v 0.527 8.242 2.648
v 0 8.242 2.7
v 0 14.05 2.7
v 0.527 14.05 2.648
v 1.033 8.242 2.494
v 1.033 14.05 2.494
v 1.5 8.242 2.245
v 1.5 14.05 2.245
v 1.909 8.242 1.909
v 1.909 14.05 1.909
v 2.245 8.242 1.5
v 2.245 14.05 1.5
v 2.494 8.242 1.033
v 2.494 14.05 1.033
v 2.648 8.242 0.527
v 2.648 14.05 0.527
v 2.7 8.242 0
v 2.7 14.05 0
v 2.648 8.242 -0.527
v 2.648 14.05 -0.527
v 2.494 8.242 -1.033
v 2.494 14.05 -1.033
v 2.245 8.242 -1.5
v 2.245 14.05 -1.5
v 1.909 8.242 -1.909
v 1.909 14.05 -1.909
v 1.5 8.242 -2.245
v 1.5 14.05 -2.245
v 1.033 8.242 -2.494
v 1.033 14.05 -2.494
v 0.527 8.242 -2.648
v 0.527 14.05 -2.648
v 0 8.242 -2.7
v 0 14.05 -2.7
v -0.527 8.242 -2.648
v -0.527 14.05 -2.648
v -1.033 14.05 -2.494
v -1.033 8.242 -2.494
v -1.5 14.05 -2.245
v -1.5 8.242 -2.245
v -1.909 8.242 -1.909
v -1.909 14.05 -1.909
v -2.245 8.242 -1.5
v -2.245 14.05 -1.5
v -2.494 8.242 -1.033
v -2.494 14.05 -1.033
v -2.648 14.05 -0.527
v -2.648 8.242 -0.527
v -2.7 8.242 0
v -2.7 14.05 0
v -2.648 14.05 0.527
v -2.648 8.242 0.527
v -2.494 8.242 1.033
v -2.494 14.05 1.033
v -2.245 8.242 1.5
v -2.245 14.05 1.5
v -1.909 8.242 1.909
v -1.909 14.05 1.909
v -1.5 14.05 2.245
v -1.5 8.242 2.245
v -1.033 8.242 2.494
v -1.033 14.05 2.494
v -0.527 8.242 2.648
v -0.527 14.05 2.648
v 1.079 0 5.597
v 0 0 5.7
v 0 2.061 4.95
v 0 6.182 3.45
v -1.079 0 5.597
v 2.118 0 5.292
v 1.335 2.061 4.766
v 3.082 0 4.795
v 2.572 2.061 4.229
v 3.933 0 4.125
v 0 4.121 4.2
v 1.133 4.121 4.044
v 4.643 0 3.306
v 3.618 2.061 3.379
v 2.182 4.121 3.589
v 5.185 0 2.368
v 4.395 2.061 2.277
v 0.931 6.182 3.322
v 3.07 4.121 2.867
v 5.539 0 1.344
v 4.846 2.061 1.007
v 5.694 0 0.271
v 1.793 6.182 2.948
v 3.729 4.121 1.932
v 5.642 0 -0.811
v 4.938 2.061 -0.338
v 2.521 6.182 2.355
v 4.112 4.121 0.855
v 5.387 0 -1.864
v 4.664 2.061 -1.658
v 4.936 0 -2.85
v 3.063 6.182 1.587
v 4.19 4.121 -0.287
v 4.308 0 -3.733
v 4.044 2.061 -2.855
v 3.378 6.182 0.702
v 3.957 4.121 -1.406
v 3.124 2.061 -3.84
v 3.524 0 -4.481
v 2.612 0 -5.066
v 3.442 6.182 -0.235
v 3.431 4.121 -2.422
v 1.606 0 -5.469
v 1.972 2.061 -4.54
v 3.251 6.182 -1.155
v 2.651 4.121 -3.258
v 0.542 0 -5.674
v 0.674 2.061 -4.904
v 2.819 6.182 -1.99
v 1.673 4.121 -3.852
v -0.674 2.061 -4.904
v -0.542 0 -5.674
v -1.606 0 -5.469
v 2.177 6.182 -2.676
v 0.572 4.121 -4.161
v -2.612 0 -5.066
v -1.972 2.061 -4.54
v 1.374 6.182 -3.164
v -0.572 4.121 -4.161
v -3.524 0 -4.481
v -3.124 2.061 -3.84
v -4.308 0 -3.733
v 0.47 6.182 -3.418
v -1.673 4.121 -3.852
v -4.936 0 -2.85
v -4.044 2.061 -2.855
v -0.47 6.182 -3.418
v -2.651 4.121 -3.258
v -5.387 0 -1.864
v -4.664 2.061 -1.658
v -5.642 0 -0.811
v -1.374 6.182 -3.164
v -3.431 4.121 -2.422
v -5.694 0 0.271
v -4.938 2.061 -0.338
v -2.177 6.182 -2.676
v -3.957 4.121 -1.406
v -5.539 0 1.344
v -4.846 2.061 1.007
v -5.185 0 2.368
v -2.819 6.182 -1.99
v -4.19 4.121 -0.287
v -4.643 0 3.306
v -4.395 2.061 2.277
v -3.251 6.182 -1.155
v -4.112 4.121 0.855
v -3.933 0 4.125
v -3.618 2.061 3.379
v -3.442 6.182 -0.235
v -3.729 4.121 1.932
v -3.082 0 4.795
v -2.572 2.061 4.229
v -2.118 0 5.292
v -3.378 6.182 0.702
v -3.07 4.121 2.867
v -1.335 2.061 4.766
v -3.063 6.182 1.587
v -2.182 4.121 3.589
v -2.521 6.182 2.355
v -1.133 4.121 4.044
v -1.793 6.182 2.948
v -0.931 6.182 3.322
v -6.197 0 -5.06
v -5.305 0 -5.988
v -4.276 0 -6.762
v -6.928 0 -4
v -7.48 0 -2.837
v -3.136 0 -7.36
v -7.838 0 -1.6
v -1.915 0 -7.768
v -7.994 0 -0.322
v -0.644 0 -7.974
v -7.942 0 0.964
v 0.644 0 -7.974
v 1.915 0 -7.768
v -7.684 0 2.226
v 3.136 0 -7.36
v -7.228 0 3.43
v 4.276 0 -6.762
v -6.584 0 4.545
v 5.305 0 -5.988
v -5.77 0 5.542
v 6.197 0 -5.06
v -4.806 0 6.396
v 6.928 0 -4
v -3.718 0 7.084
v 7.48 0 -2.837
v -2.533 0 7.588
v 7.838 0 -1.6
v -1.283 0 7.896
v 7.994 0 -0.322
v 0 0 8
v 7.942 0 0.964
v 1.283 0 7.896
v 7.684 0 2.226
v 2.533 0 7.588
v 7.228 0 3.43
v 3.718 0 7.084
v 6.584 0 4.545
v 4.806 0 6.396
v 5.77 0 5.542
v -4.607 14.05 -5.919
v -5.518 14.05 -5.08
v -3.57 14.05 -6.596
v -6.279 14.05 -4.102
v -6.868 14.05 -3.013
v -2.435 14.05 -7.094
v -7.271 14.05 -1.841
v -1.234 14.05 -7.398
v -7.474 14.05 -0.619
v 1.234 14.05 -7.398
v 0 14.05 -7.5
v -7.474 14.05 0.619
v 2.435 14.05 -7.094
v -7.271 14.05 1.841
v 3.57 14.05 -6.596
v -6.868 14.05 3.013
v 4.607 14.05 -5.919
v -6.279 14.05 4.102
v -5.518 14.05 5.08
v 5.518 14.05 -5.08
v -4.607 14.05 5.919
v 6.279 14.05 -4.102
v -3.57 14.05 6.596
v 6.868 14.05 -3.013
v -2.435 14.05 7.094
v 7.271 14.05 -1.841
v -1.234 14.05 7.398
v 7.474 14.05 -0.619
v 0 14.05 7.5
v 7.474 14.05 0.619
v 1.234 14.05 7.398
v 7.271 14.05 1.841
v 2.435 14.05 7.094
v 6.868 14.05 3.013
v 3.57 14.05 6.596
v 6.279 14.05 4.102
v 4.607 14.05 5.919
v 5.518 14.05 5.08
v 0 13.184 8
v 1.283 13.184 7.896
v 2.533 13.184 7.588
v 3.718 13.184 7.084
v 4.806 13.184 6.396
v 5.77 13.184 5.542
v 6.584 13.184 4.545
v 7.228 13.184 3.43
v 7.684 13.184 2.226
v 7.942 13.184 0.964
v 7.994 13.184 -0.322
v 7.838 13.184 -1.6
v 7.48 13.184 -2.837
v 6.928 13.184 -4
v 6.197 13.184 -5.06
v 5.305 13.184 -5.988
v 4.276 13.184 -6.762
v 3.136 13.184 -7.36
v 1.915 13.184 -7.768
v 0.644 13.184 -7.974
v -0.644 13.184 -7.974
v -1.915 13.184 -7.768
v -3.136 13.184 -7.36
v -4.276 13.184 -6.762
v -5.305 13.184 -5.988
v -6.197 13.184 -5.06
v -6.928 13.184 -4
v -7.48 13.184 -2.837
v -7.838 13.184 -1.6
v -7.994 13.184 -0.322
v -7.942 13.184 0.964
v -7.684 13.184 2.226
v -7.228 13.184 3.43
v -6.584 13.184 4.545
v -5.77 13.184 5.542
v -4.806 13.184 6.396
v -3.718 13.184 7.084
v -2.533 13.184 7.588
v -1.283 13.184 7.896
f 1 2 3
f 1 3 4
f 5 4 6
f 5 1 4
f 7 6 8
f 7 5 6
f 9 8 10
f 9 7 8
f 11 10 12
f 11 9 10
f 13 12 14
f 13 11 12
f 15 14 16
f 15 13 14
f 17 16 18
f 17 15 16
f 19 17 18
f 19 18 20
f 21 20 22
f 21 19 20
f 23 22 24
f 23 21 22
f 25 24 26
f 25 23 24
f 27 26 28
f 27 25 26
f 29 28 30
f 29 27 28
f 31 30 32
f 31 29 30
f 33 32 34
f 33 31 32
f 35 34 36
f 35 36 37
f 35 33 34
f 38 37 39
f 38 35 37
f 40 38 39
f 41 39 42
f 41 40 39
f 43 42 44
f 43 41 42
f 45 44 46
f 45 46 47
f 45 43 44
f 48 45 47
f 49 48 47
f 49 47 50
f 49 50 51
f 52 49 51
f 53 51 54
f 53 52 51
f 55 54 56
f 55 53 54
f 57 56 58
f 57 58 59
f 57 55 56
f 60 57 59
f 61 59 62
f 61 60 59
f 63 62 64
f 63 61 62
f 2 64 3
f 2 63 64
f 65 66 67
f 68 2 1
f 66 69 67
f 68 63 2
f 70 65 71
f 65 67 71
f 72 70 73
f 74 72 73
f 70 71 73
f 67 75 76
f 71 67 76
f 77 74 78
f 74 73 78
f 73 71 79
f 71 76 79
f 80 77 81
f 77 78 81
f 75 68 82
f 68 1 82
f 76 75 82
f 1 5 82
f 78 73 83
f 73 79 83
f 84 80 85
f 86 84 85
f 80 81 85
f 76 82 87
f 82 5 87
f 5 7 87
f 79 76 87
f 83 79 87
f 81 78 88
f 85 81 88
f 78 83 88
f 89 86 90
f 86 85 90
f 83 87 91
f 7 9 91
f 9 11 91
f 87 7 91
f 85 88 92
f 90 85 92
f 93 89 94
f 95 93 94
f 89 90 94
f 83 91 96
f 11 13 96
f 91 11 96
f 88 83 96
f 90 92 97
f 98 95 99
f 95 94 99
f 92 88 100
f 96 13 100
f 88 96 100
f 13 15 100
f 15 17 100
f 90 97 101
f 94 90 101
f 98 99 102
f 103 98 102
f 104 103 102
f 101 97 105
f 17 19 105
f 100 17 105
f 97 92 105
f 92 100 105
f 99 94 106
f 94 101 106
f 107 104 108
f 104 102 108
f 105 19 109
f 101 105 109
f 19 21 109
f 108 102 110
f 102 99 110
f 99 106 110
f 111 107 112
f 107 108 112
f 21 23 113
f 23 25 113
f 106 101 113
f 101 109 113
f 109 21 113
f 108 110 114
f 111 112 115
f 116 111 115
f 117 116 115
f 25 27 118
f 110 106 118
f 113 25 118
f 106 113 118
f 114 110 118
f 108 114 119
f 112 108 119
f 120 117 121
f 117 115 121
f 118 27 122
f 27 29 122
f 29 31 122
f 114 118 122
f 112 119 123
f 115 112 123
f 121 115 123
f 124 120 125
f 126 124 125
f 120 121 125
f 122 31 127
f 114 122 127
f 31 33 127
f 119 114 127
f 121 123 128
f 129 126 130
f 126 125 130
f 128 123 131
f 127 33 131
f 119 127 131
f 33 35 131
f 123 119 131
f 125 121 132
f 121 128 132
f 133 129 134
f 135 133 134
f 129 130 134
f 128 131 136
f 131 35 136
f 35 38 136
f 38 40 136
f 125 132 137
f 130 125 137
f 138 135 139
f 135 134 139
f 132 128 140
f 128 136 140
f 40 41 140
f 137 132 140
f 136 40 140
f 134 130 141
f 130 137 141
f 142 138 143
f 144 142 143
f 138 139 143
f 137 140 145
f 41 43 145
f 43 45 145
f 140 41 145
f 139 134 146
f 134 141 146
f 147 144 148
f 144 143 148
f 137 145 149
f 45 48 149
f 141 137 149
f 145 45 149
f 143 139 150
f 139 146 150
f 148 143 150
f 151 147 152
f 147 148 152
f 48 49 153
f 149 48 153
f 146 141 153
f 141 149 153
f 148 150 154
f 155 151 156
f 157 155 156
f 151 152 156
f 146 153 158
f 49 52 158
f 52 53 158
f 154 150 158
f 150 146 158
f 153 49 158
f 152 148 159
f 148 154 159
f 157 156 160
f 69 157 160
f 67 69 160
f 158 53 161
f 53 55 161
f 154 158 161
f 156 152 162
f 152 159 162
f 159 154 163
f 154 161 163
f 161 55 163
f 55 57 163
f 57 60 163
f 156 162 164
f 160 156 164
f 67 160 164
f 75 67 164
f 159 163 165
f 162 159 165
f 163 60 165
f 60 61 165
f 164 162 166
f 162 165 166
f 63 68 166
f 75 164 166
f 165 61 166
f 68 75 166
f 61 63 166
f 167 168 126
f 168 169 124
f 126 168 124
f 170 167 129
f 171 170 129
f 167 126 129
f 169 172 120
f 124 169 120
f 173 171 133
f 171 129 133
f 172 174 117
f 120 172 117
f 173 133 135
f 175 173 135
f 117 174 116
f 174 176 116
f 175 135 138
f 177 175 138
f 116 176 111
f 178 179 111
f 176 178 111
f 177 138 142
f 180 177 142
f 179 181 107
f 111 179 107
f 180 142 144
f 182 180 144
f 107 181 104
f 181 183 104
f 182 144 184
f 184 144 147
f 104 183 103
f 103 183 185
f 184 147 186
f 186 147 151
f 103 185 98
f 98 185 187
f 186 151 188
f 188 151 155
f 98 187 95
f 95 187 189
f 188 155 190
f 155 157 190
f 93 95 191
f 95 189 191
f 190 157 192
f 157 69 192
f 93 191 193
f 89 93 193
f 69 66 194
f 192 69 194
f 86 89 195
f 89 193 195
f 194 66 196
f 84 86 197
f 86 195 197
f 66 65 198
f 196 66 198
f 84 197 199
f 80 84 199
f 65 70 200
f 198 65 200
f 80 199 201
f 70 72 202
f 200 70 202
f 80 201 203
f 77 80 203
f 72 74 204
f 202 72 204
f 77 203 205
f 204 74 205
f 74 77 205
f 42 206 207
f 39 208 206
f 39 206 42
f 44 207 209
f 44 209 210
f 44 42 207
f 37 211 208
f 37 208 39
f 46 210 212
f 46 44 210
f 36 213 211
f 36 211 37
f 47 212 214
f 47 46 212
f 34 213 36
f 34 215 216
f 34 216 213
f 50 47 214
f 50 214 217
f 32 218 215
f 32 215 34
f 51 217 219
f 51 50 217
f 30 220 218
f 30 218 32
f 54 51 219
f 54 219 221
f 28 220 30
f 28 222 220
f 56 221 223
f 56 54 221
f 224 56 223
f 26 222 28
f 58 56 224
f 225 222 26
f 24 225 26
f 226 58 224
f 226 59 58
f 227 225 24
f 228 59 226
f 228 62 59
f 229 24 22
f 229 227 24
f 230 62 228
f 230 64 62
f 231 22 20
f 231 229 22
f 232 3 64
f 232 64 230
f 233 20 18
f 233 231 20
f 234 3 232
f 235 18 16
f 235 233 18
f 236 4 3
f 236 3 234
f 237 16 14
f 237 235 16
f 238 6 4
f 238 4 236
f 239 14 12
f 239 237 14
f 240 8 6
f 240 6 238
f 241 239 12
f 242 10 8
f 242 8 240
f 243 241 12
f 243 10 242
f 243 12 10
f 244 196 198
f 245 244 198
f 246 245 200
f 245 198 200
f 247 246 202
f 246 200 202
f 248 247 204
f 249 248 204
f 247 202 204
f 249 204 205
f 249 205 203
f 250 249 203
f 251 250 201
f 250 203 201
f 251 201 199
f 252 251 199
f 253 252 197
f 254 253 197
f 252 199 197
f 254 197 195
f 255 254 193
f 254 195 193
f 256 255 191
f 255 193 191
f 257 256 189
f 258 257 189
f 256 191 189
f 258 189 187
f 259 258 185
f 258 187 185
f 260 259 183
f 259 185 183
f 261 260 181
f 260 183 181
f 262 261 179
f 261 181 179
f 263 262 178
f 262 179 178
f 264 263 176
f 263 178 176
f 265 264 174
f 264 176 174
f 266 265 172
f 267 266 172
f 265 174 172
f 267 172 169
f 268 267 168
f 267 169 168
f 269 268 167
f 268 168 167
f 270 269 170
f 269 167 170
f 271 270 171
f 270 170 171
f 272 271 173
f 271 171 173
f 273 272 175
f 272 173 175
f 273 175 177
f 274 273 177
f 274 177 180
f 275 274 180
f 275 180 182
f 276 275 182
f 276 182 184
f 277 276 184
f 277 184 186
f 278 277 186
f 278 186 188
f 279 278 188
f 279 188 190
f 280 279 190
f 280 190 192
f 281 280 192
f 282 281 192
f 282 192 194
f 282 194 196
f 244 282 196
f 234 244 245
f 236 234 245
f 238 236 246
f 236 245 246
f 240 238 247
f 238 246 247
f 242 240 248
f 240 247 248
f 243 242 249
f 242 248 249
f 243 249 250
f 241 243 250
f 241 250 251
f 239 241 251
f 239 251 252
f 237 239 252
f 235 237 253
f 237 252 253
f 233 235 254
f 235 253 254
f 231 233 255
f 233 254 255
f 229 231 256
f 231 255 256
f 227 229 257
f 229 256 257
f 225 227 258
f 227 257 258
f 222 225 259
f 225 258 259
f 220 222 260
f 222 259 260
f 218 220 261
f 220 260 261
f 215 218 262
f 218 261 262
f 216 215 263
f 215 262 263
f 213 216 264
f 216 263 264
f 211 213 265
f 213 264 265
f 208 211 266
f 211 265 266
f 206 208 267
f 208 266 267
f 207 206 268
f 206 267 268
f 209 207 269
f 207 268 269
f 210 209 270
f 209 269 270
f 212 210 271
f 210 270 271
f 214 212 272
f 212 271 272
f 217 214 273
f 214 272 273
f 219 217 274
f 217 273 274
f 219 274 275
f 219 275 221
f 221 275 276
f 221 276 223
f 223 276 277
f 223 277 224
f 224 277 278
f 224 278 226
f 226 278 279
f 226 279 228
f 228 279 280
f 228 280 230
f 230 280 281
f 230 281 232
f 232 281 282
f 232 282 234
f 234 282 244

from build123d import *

# Parameters (mm, degrees)
SKETCH1_R           = 8
SKETCH1_R_2         = 2.7
BOSS_EXTRUDE1_DEPTH = 14.05
CHAMFER1_SIZE       = 3
CHAMFER1_SIZE2      = 8.242432258
CHAMFER2_SIZE       = 0.5
CHAMFER2_SIZE2      = 0.866025404


with BuildPart() as part:
    # Sketch1 → Boss-Extrude1 (new body)
    with BuildSketch(Plane(origin=(0, 0, 0), x_dir=(1, 0, 0), z_dir=(0, 1, 0))):
        with Locations(Location((0, 0, 0), (0, 0, 270))):
            Circle(SKETCH1_R)
        with Locations(Location((0, 0, 0), (0, 0, 270))):
            Circle(SKETCH1_R_2, mode=Mode.SUBTRACT)
    extrude(amount=BOSS_EXTRUDE1_DEPTH)

    # Chamfer1
    chamfer1_edges = [part.edges().sort_by_distance(p)[0] for p in [
        (0, 0, -2.7),
    ]]
    chamfer1_side = [part.faces().sort_by_distance(p)[0] for p in [
        (0, 0, -7.77372583),
    ]]
    chamfer(chamfer1_edges, length=CHAMFER1_SIZE, length2=CHAMFER1_SIZE2, reference=chamfer1_side[0])

    # Chamfer2
    chamfer2_edges = [part.edges().sort_by_distance(p)[0] for p in [
        (0, 14.05, -8),
    ]]
    chamfer2_side = [part.faces().sort_by_distance(p)[0] for p in [
        (0, 14.05, -7.77372583),
    ]]
    chamfer(chamfer2_edges, length=CHAMFER2_SIZE, length2=CHAMFER2_SIZE2, reference=chamfer2_side[0])


solid = part.part
